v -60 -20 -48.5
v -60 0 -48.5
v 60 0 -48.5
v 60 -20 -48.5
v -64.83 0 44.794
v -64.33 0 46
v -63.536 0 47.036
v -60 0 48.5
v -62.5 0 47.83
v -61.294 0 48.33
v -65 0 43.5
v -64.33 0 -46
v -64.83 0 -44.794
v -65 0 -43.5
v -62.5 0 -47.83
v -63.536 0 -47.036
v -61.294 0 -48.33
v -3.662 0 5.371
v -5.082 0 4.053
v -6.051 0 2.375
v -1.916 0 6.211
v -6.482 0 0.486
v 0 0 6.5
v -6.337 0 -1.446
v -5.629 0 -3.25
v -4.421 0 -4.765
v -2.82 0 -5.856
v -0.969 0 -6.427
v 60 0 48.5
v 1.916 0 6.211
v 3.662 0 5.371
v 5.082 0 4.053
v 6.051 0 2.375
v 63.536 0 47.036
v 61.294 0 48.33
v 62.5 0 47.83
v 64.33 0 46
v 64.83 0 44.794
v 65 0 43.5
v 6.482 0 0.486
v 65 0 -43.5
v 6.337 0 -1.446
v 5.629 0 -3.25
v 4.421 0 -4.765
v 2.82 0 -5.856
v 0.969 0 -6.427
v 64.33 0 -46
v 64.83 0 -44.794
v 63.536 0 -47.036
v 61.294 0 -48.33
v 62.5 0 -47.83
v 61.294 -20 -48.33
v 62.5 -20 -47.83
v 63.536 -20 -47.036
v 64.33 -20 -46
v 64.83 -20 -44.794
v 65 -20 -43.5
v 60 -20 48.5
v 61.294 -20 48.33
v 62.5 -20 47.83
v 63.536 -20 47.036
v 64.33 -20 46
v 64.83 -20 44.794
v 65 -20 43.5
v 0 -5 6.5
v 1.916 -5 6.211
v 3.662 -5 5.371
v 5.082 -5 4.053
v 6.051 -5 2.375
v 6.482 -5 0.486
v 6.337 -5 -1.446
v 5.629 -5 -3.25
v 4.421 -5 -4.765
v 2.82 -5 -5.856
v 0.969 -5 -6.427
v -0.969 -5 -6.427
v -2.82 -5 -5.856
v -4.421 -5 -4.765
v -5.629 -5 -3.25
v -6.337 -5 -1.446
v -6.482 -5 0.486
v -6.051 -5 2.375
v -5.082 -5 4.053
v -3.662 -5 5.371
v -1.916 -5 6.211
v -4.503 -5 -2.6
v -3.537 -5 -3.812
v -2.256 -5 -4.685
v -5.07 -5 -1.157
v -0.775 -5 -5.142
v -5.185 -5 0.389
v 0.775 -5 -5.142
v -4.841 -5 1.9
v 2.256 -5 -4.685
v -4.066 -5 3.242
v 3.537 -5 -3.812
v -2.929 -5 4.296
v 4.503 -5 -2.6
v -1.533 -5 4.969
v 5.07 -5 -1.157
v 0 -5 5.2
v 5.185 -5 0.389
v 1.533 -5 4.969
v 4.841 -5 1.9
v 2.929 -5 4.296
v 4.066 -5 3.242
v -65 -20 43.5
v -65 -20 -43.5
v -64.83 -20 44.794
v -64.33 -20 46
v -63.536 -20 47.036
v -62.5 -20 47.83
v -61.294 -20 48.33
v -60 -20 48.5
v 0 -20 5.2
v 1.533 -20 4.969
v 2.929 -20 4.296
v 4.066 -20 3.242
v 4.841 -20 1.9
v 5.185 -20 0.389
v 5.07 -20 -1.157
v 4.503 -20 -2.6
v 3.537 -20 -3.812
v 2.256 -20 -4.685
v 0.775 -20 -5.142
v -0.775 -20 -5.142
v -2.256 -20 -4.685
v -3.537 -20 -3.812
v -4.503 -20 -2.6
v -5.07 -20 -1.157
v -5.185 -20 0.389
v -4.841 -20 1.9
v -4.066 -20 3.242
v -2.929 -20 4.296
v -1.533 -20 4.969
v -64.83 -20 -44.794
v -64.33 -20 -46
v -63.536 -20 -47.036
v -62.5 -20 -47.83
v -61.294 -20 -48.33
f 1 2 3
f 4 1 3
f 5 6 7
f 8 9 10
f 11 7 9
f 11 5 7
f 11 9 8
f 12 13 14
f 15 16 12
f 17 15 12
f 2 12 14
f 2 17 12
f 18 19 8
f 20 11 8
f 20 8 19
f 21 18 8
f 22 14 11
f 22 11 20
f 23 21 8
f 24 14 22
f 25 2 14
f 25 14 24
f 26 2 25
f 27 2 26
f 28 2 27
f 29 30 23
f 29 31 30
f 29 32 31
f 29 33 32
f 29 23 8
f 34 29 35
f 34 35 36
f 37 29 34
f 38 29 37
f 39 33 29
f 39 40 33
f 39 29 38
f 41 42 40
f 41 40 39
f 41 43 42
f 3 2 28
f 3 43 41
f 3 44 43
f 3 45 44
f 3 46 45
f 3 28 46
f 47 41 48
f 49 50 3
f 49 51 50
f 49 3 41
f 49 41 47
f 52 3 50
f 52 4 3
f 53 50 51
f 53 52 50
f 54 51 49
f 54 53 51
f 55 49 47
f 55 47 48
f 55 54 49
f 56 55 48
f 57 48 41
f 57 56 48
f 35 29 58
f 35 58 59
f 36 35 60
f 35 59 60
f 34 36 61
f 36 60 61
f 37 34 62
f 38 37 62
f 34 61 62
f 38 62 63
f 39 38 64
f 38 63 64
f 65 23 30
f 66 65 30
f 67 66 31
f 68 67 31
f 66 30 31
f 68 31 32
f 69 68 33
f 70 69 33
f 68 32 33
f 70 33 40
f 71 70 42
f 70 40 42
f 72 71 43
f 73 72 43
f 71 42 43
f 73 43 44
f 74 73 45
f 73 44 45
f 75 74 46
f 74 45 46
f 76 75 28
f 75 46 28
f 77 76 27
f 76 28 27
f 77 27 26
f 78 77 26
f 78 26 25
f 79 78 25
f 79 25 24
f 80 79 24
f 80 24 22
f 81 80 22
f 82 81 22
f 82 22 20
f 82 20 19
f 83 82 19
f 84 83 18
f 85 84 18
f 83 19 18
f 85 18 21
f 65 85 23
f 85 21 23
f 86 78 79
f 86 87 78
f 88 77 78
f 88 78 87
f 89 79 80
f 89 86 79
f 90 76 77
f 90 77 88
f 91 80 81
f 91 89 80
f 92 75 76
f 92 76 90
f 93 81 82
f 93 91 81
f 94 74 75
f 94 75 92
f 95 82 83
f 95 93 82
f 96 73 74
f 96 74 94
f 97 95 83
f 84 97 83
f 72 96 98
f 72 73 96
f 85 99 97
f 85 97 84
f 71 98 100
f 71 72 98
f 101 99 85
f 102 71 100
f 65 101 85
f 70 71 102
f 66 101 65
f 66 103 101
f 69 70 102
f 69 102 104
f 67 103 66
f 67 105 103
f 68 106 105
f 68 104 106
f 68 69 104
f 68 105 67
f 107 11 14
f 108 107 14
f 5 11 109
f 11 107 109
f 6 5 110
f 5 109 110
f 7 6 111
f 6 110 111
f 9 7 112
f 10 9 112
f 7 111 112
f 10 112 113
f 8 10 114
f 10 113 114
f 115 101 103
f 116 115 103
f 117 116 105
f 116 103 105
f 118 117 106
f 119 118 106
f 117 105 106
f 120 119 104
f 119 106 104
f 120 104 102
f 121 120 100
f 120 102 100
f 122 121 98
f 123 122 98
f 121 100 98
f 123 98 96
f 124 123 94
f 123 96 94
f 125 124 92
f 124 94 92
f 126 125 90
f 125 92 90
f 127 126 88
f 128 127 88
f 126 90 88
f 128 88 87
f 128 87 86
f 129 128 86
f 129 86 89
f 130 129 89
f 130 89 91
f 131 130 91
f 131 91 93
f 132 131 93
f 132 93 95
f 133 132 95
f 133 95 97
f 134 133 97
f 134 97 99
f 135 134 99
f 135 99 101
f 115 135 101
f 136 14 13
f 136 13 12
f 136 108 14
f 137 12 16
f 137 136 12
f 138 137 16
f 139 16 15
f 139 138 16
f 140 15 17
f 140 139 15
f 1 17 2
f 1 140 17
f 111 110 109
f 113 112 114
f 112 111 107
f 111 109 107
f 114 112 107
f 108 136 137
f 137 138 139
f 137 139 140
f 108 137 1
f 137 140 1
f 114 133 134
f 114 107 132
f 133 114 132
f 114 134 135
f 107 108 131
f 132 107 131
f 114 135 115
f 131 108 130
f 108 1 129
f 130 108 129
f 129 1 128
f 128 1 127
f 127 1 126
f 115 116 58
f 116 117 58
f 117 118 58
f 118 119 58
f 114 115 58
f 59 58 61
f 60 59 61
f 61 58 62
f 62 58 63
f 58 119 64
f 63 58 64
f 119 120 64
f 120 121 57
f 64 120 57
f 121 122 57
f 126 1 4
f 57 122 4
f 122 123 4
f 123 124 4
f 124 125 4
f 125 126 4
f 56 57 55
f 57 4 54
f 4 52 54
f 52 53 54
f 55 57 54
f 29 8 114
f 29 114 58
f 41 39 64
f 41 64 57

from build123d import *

# Parameters (mm, degrees)
SKETCH1_W           = 130
SKETCH1_H           = 97
BOSS_EXTRUDE1_DEPTH = 20
SKETCH2_R           = 5.2
CUT_EXTRUDE1_DEPTH  = 84.529934754
SKETCH3_R           = 6.5
CUT_EXTRUDE2_DEPTH  = 5
FILLET1_R           = 5


with BuildPart() as part:
    # Sketch1 → Boss-Extrude1 (new body)
    with BuildSketch(Plane(origin=(0, 0, 0), x_dir=(1, 0, 0), z_dir=(0, 1, 0))):
        Rectangle(SKETCH1_W, SKETCH1_H)
    extrude(amount=-BOSS_EXTRUDE1_DEPTH)

    # Sketch2 → Cut-Extrude1 (cut, through all)
    with BuildSketch(Plane(origin=(0, 0, 0), x_dir=(1, 0, 0), z_dir=(0, 1, 0))):
        with Locations(Location((0, 0, 0), (0, 0, 270))):
            Circle(SKETCH2_R)
    extrude(amount=-CUT_EXTRUDE1_DEPTH, mode=Mode.SUBTRACT)

    # Sketch3 → Cut-Extrude2 (cut)
    with BuildSketch(Plane(origin=(0, 0, 0), x_dir=(1, 0, 0), z_dir=(0, 1, 0))):
        with Locations(Location((0, 0, 0), (0, 0, 270))):
            Circle(SKETCH3_R)
    extrude(amount=-CUT_EXTRUDE2_DEPTH, mode=Mode.SUBTRACT)

    # Fillet1
    fillet1_edges = [part.edges().sort_by_distance(p)[0] for p in [
        (65, -10, 48.5),
        (-65, -10, 48.5),
        (-65, -10, -48.5),
        (65, -10, -48.5),
    ]]
    fillet(fillet1_edges, radius=FILLET1_R)


solid = part.part
